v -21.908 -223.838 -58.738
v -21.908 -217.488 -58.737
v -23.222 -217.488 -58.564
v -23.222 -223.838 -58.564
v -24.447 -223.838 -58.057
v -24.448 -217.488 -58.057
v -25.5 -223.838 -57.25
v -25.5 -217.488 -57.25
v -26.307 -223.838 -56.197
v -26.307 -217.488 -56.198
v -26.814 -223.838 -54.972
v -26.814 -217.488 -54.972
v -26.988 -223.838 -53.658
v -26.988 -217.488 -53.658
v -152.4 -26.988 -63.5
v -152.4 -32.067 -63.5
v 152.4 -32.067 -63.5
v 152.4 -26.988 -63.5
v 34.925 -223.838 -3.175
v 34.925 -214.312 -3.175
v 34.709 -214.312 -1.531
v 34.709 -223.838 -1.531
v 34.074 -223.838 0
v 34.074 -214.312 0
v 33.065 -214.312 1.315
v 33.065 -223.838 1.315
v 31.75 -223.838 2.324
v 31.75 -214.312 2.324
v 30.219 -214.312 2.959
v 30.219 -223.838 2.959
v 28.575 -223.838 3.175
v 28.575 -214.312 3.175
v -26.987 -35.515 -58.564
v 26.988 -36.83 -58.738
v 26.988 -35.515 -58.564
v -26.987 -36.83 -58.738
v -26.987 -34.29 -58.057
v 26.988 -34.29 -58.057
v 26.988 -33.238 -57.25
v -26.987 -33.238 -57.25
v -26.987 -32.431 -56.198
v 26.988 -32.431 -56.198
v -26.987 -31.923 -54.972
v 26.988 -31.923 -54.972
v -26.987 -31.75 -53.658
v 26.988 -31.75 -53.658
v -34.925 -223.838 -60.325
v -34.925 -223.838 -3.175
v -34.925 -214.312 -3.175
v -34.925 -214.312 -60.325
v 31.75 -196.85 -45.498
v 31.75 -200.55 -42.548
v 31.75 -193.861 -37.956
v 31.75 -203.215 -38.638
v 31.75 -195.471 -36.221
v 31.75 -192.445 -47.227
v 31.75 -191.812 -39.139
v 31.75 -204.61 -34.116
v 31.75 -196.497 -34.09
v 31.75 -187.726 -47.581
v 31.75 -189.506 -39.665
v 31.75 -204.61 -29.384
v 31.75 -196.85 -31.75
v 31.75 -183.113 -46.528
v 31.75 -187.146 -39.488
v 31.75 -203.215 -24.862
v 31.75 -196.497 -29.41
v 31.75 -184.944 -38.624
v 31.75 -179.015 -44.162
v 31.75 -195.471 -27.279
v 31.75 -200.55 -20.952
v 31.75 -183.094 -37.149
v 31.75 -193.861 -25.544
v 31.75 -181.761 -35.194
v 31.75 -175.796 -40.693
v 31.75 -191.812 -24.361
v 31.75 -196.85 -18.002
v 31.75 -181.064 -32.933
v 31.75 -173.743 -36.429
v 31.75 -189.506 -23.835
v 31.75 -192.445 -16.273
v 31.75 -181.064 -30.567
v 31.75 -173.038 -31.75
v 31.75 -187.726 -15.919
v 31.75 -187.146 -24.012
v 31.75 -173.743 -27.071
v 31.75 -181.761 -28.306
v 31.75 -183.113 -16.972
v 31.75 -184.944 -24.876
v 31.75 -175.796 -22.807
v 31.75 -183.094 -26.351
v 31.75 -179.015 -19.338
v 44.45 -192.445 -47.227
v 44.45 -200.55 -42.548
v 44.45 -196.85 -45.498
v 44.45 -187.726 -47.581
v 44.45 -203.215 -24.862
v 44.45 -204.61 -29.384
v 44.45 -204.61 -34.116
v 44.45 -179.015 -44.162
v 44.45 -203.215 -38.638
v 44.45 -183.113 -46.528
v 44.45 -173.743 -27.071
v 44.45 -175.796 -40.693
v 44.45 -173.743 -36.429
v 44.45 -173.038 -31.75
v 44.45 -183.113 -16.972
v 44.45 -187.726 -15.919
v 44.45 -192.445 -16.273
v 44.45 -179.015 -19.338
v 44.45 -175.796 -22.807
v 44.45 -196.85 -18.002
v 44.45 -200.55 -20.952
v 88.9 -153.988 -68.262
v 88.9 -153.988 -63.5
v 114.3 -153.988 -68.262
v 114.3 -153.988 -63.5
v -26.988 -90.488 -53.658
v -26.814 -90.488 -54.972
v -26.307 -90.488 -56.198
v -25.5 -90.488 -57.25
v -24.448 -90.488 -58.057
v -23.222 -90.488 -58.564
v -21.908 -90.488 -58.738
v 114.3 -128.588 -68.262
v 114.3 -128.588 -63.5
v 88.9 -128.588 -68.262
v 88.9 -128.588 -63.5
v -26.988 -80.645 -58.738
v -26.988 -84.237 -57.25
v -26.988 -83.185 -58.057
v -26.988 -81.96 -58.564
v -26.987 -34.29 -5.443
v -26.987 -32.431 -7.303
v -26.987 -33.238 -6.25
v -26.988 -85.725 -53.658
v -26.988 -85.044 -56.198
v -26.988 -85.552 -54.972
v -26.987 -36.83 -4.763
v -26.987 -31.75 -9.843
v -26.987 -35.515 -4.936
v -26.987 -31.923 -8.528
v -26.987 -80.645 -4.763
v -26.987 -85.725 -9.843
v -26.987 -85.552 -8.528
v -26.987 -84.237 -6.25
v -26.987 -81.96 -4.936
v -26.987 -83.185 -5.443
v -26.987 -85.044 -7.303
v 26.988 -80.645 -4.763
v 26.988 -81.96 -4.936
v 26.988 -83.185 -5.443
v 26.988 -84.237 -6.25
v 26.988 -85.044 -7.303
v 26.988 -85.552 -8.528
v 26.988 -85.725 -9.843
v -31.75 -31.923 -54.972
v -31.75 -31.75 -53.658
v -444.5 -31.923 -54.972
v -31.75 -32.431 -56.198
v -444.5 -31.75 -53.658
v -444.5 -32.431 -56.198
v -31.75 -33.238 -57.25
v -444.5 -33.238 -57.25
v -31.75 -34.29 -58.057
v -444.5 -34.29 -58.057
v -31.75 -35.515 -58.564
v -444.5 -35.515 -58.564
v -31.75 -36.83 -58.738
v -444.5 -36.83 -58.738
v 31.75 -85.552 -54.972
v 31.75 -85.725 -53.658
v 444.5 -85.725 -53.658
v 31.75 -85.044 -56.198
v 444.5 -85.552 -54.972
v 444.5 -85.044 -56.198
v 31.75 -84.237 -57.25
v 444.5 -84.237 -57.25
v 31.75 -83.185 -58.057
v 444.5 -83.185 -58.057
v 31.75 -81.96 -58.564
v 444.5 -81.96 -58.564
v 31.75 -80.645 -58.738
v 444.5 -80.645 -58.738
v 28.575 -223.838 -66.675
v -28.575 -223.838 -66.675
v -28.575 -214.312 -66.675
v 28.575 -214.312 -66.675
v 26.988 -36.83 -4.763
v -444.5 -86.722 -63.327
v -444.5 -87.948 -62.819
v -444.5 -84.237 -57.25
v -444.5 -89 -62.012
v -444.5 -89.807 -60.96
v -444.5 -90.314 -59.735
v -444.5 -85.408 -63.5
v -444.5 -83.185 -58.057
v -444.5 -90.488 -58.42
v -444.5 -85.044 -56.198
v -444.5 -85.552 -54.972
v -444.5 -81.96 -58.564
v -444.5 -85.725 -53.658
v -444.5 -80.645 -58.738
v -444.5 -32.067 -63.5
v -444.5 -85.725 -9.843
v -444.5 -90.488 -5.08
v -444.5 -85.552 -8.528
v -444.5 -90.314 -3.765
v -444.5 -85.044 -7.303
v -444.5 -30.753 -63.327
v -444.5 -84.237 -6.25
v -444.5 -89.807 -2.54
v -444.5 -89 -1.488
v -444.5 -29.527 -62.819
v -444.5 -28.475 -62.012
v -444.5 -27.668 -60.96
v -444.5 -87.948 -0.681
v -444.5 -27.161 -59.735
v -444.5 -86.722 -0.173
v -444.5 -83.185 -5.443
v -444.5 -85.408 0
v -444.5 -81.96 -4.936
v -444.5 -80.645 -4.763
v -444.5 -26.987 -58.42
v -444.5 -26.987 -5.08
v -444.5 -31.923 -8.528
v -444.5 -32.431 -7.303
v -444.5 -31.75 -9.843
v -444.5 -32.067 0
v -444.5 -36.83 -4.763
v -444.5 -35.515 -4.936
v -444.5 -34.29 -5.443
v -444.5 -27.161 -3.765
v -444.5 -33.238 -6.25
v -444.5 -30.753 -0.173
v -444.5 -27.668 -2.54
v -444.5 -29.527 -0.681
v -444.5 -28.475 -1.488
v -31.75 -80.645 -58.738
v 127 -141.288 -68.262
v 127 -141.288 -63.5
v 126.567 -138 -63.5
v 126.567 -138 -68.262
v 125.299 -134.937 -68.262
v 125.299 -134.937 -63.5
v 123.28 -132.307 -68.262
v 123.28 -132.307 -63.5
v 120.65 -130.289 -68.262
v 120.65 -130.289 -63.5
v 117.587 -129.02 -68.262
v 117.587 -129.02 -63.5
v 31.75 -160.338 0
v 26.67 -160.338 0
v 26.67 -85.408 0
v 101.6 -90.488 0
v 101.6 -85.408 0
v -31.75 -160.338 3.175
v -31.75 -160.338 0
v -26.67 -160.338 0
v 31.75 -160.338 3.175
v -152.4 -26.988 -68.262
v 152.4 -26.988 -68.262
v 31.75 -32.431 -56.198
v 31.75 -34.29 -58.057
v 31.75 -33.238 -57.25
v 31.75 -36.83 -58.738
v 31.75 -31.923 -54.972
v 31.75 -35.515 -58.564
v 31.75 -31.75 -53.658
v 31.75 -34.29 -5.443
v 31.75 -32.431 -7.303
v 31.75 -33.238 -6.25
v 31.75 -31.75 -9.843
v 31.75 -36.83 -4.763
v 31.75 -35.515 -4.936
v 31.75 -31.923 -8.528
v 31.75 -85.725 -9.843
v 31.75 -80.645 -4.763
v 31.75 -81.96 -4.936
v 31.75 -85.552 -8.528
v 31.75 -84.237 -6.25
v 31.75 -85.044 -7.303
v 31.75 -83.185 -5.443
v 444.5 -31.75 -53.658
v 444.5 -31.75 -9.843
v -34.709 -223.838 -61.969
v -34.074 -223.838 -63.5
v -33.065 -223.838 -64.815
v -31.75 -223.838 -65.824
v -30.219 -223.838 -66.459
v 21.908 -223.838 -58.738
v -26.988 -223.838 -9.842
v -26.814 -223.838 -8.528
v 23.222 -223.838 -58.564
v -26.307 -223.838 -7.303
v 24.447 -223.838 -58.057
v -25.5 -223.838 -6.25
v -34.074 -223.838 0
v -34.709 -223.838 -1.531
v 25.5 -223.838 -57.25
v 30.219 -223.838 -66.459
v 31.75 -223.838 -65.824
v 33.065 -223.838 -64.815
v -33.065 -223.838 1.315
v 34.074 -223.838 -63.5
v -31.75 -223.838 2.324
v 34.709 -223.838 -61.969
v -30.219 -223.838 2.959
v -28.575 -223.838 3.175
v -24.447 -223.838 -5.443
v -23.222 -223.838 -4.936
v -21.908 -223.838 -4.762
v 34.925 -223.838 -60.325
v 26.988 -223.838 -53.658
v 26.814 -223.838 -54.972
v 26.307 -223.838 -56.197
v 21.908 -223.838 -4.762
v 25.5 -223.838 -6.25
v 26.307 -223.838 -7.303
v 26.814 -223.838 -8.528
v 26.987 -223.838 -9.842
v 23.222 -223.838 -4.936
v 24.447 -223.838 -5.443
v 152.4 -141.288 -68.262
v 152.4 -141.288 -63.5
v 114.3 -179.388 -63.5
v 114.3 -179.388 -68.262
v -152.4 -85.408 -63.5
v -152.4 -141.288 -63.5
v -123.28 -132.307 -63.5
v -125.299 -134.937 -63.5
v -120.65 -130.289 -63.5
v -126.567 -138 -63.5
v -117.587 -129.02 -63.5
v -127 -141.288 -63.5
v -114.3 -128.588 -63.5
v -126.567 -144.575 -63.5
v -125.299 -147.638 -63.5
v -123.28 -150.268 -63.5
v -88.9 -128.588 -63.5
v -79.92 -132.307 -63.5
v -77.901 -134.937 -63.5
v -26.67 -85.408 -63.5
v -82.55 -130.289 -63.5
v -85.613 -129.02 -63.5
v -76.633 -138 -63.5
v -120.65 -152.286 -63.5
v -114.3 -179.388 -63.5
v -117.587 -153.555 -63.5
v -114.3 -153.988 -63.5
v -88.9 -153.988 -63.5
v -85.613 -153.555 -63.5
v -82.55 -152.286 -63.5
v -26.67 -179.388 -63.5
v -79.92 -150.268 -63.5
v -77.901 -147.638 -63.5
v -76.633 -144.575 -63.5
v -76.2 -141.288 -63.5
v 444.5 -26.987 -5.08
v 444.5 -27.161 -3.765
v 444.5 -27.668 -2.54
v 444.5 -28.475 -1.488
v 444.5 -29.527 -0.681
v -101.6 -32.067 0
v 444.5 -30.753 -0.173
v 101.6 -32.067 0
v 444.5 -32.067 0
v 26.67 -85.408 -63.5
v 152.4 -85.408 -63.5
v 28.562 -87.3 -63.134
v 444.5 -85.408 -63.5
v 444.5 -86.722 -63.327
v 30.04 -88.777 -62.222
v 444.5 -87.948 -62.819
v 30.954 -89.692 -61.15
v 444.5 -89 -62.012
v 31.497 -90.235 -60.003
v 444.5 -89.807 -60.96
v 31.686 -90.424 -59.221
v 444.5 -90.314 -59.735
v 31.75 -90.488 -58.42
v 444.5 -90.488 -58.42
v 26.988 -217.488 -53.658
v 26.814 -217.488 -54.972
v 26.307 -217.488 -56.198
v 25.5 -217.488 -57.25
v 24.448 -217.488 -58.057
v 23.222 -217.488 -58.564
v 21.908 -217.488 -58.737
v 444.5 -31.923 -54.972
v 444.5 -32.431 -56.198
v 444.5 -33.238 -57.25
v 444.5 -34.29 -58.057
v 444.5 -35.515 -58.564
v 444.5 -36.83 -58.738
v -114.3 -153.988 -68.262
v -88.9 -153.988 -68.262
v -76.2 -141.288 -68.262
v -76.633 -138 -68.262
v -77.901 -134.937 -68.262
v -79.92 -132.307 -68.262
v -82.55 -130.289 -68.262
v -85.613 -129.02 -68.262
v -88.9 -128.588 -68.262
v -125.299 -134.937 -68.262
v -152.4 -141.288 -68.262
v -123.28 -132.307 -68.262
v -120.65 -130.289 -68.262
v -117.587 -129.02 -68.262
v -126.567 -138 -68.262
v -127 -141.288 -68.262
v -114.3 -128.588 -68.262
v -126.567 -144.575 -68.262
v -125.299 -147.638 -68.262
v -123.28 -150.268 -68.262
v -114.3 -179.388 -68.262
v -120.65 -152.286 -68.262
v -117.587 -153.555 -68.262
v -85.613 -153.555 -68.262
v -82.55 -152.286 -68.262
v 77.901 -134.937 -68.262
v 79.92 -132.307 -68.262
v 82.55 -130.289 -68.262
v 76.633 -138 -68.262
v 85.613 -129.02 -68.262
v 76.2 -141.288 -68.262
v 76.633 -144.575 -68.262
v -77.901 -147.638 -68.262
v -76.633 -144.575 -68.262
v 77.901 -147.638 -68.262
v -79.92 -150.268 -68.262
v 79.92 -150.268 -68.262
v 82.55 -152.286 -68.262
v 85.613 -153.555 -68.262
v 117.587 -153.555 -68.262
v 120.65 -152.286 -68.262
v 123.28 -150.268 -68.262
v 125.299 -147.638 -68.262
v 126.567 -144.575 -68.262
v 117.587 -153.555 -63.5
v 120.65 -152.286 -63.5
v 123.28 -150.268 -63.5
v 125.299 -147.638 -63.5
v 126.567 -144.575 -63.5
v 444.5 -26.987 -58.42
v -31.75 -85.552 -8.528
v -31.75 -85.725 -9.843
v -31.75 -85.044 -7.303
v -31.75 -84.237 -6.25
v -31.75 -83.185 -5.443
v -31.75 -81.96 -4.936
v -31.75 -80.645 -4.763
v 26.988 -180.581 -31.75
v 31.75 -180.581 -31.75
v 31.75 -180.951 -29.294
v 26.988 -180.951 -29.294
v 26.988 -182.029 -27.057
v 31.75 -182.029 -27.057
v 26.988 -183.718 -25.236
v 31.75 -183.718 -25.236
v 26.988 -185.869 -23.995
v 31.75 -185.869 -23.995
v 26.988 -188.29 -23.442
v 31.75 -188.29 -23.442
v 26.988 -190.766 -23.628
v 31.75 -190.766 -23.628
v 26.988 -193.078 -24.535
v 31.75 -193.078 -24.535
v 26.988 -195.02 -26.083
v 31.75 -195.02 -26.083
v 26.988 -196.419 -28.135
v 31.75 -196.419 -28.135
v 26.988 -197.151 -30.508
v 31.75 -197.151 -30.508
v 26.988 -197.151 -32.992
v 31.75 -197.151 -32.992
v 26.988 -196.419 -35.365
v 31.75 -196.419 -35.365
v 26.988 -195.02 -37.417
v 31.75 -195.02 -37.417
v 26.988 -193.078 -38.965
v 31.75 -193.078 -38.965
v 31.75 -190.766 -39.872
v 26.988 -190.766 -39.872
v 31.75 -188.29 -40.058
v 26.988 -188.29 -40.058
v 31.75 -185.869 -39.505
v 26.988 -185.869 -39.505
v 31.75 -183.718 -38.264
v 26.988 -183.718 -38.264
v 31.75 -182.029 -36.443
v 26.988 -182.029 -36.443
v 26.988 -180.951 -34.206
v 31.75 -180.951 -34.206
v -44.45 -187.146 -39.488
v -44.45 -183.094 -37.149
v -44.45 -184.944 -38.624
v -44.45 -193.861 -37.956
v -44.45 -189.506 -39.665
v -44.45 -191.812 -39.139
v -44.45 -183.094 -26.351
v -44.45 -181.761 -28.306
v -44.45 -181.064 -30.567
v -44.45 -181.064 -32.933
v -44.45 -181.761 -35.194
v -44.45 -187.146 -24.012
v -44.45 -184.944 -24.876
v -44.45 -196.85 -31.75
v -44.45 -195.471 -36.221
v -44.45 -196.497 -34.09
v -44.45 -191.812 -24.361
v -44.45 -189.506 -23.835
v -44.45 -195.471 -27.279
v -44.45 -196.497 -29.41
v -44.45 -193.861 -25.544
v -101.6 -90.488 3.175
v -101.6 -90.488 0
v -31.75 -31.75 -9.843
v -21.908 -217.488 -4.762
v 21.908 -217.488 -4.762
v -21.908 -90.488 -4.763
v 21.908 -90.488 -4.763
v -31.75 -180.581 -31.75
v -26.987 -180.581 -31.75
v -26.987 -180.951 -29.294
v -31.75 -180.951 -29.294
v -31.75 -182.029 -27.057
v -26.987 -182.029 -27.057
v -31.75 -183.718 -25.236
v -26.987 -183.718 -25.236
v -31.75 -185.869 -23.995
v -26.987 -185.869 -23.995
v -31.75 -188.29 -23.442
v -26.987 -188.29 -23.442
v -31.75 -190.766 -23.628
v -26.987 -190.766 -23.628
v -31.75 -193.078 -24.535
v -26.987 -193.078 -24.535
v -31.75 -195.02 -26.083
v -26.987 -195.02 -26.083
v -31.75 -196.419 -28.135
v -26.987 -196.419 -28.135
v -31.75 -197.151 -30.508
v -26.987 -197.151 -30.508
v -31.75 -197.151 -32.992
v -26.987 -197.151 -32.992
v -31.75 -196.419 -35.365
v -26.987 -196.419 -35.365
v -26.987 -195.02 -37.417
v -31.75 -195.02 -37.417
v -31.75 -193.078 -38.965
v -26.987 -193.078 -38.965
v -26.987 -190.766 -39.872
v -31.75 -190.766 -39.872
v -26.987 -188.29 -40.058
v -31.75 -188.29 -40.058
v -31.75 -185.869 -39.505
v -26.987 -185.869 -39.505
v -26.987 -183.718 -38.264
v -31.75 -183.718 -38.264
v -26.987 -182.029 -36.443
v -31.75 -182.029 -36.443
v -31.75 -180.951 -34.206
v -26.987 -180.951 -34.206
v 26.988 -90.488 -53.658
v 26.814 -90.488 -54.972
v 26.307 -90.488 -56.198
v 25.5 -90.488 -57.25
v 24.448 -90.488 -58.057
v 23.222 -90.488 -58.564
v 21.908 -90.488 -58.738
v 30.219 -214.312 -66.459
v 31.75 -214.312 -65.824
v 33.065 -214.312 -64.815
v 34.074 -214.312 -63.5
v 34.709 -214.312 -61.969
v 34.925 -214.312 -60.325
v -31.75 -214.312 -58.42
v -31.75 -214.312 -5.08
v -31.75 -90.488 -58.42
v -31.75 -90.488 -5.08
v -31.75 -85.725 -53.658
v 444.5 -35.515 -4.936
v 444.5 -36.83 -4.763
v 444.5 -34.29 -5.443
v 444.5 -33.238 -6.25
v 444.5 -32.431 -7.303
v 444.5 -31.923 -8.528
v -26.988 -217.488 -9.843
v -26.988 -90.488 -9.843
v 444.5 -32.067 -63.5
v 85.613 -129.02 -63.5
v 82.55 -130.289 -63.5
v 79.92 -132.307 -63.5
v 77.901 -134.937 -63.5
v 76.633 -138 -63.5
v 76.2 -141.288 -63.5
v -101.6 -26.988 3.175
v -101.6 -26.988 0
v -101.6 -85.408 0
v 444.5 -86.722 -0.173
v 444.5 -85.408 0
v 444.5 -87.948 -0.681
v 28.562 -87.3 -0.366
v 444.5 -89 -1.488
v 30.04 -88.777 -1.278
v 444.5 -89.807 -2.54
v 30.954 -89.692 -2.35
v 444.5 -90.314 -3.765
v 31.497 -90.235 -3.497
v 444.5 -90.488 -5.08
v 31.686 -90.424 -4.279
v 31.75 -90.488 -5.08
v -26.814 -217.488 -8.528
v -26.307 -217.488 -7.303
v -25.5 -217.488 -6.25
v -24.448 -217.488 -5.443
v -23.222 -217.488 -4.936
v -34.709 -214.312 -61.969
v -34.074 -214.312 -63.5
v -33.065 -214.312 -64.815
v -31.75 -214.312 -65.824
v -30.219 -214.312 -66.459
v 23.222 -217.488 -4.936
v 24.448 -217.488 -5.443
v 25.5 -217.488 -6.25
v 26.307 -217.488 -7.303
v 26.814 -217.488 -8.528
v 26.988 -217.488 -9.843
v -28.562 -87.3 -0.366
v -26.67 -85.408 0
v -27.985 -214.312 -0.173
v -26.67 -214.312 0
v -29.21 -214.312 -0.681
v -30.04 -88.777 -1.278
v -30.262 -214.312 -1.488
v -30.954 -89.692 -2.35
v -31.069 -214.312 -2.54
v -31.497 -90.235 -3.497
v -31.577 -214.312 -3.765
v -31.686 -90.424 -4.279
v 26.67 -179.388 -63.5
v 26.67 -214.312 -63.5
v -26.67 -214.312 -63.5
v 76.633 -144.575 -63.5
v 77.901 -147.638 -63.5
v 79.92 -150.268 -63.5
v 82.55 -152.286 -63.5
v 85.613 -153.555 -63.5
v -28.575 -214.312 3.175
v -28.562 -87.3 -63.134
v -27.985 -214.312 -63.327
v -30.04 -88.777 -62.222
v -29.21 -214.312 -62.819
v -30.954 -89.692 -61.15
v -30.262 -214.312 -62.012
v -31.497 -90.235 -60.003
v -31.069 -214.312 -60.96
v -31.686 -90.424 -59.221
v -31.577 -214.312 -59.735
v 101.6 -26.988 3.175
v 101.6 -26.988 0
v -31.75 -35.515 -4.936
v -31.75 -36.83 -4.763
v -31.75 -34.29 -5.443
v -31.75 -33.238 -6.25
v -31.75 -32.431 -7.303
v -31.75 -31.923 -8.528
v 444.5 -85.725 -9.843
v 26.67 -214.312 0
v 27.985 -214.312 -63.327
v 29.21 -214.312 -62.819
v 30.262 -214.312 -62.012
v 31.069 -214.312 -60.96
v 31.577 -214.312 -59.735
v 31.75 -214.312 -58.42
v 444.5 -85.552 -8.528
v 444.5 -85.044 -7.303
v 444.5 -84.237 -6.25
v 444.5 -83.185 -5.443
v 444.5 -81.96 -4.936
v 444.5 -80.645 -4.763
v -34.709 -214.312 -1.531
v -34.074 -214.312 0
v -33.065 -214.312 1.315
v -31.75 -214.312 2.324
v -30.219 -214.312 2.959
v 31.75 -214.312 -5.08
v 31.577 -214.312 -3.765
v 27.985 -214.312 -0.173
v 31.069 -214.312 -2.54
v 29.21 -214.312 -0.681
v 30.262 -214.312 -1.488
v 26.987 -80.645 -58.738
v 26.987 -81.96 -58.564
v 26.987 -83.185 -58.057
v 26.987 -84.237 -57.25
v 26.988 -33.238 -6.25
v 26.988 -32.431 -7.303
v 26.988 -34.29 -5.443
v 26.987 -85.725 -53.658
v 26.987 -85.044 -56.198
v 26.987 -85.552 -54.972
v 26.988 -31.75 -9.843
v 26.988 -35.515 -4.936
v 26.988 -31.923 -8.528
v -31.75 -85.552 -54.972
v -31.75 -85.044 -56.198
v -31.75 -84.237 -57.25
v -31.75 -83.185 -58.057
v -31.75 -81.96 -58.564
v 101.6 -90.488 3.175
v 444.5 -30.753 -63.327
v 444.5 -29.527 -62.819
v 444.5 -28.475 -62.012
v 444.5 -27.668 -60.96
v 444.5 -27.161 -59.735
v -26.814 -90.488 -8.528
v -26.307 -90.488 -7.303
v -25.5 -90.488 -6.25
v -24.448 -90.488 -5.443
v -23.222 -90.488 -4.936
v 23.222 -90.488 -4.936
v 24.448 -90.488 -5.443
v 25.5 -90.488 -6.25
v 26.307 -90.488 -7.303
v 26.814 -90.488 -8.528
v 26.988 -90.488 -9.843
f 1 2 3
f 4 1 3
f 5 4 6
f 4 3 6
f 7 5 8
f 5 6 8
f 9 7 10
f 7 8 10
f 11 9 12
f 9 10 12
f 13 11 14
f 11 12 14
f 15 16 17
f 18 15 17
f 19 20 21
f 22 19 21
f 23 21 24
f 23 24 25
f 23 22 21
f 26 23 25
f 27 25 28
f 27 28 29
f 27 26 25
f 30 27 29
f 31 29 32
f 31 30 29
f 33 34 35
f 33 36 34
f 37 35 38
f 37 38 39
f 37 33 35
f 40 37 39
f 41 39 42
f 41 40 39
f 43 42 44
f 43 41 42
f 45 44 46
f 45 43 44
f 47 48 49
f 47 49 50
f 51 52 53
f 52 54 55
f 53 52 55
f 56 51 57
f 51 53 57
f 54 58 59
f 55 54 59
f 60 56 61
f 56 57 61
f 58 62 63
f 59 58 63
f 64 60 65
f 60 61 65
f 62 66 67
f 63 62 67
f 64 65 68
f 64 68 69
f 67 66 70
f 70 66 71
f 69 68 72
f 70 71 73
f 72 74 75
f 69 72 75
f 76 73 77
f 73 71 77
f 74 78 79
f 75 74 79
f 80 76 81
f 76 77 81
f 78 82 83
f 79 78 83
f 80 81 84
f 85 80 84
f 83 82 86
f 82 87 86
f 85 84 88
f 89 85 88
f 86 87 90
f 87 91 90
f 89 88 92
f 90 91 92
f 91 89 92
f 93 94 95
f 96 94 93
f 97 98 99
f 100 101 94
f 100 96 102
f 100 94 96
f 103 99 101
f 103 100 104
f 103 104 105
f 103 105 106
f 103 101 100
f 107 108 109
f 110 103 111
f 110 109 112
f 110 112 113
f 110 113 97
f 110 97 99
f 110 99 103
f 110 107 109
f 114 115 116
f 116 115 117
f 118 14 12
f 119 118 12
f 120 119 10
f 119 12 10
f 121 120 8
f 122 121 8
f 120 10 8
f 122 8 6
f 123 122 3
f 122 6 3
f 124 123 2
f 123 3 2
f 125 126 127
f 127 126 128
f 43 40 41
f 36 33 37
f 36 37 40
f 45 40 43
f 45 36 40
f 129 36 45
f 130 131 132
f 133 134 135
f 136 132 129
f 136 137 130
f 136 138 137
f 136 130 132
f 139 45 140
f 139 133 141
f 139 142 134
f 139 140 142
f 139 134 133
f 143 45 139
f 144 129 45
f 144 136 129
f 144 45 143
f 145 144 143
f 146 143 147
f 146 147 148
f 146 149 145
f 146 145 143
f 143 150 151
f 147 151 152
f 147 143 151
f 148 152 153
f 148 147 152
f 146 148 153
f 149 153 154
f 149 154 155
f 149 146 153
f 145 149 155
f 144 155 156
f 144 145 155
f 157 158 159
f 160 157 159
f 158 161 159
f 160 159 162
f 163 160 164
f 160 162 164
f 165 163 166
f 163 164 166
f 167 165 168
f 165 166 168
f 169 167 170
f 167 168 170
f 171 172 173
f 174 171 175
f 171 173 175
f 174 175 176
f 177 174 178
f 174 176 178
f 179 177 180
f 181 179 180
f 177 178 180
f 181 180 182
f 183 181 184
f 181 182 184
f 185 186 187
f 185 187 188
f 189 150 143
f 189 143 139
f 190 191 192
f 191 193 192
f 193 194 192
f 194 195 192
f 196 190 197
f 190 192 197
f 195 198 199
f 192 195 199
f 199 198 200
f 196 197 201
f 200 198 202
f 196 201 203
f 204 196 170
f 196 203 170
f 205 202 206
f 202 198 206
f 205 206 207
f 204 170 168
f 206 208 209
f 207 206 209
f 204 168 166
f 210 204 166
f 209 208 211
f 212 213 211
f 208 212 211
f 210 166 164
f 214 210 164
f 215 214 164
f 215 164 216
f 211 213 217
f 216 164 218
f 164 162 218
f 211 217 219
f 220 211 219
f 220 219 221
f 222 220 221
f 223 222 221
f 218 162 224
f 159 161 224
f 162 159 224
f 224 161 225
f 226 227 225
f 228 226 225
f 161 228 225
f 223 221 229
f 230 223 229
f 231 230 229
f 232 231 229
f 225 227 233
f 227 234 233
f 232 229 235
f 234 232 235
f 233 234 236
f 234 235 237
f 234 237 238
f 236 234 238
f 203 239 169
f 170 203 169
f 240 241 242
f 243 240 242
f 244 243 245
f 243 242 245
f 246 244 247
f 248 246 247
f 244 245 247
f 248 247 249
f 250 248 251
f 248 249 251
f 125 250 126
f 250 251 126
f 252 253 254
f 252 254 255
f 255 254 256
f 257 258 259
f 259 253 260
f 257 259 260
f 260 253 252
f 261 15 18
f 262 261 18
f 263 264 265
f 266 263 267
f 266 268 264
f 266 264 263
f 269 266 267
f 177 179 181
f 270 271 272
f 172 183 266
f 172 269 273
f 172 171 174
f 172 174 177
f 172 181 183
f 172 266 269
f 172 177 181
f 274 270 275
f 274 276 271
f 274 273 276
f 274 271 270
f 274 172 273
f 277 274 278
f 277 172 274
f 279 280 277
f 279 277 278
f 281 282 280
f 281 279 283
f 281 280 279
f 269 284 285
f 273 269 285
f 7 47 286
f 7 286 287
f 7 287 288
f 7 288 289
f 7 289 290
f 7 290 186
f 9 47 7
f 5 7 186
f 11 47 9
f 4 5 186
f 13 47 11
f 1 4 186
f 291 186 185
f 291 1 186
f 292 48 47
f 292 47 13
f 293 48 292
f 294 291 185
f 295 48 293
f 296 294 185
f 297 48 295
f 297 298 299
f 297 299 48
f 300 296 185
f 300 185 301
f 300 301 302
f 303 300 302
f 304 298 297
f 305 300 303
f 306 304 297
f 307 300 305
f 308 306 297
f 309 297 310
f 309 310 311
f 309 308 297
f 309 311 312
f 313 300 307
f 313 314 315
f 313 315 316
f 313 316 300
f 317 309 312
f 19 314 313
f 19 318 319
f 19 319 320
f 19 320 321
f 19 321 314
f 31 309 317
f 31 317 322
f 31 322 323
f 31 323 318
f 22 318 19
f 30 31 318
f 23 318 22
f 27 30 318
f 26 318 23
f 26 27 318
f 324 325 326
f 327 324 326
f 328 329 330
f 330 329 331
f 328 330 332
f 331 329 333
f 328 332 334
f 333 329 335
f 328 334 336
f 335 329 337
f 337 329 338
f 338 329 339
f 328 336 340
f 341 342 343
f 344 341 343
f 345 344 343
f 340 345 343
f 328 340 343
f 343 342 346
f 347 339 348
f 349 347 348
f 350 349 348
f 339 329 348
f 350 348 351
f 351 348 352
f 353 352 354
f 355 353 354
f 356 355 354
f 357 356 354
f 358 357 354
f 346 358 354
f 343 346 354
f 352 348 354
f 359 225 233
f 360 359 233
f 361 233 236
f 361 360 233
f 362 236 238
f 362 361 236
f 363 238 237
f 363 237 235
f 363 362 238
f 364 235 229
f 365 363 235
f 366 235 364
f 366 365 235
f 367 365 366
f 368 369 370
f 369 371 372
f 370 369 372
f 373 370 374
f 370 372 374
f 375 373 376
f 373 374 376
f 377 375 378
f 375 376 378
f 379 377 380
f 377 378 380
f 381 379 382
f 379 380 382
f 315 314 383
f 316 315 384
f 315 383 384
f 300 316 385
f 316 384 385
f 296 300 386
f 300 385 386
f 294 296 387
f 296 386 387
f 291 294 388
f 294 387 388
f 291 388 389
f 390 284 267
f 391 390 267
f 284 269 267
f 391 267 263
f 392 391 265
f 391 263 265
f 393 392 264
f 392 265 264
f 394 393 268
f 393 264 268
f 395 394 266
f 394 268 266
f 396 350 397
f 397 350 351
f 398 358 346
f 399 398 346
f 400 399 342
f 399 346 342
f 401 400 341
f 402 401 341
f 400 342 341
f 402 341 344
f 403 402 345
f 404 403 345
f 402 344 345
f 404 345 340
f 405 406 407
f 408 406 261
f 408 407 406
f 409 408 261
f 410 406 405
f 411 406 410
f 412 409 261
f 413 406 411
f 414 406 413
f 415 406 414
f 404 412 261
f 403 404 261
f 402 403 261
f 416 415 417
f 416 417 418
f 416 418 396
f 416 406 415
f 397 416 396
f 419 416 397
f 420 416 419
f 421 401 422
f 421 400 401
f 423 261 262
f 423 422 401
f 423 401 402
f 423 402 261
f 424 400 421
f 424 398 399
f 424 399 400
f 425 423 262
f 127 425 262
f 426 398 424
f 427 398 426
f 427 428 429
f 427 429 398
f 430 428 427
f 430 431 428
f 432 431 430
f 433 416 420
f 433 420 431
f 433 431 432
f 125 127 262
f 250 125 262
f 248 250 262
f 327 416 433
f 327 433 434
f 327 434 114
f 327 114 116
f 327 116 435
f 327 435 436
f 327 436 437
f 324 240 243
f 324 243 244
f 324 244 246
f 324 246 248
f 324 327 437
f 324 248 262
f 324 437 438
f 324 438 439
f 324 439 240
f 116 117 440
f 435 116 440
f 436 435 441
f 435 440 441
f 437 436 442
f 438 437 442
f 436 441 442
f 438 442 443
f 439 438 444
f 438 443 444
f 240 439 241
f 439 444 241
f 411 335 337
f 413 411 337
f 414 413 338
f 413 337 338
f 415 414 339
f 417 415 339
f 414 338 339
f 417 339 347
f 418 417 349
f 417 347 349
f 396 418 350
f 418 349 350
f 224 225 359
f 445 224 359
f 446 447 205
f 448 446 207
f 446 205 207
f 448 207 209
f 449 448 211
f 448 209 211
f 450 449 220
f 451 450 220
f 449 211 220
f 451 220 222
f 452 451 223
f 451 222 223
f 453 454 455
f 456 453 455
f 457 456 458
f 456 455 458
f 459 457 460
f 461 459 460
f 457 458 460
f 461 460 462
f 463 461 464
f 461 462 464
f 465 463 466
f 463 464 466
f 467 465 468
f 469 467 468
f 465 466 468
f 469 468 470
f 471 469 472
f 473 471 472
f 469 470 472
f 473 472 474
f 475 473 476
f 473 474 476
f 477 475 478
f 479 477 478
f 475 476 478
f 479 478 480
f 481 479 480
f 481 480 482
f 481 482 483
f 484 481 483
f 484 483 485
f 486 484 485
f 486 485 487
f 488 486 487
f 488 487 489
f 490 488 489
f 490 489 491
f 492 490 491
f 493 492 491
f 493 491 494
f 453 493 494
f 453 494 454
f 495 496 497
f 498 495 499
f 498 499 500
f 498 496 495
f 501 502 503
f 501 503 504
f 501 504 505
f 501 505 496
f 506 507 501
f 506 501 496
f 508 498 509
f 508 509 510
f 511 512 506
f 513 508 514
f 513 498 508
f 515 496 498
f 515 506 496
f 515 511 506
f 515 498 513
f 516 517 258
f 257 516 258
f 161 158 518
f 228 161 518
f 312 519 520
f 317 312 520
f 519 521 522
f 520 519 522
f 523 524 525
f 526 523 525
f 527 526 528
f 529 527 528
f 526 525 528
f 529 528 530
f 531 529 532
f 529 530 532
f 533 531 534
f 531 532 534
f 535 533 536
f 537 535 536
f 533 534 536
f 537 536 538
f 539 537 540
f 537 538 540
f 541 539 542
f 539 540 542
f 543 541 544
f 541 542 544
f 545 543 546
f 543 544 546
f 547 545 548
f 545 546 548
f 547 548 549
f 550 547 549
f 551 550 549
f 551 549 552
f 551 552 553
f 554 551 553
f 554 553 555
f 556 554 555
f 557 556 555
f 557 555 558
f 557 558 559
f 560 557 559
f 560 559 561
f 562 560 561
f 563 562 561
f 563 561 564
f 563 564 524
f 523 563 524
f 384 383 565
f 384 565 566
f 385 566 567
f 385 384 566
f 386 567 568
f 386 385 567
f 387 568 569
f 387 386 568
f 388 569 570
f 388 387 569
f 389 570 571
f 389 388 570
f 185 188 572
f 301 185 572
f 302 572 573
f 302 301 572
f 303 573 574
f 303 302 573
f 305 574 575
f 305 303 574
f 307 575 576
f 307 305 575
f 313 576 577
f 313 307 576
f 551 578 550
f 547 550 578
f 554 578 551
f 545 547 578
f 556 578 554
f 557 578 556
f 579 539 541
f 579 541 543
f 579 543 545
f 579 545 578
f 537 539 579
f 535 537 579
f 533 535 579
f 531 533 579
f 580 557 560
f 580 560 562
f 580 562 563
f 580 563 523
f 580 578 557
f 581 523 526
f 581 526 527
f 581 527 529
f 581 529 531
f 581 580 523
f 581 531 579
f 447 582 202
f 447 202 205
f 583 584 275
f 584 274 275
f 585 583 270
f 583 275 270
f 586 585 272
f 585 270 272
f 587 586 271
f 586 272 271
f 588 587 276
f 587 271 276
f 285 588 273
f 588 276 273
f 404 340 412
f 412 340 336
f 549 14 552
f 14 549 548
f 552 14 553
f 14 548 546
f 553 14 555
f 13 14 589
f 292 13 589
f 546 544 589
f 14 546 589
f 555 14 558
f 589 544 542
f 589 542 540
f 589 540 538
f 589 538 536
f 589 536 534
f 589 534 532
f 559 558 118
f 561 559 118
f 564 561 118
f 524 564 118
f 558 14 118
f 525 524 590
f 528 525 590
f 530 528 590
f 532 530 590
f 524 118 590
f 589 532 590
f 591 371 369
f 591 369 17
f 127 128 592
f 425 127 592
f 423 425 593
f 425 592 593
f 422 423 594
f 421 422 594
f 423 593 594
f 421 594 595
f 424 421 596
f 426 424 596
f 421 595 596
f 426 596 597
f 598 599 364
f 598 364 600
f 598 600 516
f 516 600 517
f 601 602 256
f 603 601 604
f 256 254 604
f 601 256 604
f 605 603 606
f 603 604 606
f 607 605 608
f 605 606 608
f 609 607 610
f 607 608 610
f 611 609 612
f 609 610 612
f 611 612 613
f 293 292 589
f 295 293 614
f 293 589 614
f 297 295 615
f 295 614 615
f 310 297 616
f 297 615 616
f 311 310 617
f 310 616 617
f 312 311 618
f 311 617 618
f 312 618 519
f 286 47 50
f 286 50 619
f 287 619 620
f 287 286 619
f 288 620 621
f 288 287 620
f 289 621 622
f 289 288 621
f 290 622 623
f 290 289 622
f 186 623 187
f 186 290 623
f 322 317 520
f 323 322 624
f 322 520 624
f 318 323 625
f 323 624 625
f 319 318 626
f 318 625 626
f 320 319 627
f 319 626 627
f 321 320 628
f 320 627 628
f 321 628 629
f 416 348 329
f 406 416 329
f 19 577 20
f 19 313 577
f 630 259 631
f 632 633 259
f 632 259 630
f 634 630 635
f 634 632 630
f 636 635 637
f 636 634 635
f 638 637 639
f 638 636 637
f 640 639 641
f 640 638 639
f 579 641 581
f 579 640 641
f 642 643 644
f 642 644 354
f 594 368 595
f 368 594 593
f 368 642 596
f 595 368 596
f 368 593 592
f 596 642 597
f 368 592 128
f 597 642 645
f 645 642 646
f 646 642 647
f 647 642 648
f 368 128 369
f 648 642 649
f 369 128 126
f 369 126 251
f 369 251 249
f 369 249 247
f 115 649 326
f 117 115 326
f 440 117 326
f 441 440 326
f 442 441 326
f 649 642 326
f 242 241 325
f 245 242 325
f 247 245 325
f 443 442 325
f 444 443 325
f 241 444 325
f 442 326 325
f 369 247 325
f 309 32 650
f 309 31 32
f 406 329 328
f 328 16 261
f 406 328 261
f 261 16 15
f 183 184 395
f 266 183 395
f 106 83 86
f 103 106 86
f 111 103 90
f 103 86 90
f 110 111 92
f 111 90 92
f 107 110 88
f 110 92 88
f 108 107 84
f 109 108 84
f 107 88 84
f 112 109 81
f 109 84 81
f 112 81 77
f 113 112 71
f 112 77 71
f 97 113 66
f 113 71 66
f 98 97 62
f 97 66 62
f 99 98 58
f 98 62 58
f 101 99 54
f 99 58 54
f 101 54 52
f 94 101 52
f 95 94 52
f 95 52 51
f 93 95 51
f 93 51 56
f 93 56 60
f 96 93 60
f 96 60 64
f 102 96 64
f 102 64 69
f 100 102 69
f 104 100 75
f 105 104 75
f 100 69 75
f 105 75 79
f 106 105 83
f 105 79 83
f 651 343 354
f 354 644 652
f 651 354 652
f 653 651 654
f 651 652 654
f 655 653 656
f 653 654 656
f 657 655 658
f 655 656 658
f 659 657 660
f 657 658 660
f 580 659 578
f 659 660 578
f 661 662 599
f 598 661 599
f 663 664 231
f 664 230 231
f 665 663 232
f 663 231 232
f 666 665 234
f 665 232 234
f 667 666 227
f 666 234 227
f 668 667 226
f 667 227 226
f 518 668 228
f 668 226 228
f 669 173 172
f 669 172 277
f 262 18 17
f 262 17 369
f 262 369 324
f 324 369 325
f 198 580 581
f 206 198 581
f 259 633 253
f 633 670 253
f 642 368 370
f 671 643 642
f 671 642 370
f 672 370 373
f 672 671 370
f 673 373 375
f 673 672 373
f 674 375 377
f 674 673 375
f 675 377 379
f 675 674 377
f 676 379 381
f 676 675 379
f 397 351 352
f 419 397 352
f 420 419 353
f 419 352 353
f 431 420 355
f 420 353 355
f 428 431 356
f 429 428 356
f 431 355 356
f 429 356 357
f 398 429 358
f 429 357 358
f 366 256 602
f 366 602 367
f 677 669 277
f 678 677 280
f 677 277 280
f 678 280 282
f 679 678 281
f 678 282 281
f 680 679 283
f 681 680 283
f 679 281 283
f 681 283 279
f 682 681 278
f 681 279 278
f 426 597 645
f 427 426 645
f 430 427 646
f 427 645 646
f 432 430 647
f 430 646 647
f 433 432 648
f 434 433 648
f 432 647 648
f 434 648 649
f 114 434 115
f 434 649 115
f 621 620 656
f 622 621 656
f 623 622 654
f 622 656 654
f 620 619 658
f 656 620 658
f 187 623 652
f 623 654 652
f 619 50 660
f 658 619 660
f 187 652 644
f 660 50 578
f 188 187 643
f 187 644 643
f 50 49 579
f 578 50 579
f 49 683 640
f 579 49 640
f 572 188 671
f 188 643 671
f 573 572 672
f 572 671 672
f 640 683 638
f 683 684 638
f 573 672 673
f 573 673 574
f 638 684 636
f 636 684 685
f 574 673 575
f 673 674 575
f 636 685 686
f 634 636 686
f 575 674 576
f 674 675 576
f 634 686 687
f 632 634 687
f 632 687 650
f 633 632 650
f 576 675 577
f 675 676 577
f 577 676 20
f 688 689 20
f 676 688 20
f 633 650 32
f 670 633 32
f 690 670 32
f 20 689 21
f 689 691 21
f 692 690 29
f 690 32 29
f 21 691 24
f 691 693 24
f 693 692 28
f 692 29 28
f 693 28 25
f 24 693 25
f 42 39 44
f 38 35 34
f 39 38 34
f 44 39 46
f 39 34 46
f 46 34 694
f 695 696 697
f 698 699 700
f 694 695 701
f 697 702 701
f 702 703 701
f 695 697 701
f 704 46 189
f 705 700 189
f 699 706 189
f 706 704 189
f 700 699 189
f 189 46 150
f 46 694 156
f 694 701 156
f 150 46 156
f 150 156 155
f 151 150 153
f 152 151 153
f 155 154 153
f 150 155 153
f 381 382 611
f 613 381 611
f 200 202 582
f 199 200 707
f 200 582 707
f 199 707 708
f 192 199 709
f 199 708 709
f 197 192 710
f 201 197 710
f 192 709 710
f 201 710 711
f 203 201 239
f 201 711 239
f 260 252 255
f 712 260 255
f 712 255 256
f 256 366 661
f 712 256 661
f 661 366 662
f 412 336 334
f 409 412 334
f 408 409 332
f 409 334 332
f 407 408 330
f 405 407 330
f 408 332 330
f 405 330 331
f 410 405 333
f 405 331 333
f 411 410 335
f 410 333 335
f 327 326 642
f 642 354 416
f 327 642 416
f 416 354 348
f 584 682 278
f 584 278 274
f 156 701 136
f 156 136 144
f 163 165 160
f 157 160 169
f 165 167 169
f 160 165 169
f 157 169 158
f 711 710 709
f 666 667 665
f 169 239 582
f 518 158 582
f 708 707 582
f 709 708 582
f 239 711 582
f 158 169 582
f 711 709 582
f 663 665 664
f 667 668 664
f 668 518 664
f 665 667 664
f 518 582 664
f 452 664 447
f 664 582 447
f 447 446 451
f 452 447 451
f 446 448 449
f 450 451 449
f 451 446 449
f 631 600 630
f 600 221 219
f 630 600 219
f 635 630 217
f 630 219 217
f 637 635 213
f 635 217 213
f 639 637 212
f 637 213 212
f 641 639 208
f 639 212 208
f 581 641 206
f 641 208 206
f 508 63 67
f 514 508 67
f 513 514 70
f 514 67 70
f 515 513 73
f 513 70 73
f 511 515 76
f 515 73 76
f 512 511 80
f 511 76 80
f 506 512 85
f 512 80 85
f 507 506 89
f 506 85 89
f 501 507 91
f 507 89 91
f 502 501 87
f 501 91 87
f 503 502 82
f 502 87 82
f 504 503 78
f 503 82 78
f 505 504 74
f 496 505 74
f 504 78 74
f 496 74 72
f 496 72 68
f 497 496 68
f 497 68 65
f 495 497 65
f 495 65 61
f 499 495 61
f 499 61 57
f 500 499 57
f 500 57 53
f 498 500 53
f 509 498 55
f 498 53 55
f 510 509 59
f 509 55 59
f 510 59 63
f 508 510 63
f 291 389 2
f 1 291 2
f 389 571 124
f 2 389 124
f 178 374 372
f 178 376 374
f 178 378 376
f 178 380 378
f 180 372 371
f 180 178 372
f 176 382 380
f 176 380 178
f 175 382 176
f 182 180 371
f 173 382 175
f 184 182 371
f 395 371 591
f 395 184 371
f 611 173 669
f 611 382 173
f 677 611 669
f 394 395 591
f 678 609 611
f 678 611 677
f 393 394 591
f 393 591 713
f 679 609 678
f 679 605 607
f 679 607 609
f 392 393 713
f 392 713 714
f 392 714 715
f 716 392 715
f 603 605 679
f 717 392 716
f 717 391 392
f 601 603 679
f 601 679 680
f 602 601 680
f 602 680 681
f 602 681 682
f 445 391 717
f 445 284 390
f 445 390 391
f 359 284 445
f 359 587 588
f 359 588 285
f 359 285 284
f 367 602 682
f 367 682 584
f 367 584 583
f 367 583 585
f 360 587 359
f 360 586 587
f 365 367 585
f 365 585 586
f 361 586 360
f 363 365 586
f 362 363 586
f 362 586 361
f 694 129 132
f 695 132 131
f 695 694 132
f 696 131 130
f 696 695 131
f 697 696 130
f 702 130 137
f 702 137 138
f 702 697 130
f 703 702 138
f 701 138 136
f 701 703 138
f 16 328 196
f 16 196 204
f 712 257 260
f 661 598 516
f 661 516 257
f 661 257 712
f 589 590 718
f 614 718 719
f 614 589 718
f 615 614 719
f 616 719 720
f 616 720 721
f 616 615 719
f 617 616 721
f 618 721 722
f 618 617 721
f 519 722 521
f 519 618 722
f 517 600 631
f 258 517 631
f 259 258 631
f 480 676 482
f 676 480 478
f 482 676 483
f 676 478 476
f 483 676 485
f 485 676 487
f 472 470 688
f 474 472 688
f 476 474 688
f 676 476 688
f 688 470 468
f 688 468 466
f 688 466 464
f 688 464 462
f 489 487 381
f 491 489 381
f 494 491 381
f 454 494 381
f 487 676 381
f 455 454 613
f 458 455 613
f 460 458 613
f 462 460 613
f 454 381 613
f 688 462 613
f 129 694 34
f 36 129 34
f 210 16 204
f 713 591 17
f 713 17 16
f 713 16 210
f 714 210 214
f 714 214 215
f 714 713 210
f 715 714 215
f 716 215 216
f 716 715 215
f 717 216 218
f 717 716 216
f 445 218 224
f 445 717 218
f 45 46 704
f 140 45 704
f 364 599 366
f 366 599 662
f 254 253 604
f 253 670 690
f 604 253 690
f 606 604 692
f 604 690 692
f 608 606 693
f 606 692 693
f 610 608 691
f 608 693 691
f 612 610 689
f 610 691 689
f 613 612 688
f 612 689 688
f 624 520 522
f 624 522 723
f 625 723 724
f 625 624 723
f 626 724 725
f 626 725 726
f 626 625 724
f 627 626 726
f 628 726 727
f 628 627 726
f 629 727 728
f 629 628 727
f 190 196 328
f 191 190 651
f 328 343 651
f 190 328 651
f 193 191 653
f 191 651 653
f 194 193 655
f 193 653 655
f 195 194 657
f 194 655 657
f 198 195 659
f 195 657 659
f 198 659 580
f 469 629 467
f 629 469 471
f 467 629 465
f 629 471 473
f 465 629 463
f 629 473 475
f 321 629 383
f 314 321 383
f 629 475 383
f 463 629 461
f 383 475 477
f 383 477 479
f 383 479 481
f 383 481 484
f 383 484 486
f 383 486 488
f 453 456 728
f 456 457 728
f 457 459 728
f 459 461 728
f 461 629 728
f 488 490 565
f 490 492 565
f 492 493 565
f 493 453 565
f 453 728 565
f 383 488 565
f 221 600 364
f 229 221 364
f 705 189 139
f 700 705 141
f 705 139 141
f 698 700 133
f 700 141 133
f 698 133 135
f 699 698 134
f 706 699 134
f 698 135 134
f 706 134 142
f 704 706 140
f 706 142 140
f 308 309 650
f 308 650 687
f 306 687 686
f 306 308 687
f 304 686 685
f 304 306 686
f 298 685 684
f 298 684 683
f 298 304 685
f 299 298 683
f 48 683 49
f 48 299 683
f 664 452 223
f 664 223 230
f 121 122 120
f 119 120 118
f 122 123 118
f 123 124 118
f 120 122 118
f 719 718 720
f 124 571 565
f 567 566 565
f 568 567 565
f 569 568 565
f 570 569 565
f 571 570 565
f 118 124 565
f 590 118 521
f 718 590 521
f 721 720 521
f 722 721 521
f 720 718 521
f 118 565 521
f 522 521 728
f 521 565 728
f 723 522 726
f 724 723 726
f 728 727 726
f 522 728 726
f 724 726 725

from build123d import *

# Parameters (mm, degrees)
F0_W           = 63.5
F0_H           = 63.5
F0_W_2         = 53.975
F0_H_2         = 53.975
F1_DEPTH       = 444.5
F2_W           = 63.5
F2_H           = 63.5
F2_W_2         = 53.975
F2_H_2         = 53.975
F3_DEPTH       = 127
F3_DEPTH_BACK  = 63.5
F4_R           = 5.08
F6_DEPTH       = 3.175
F8_DEPTH       = 4.7625
F10_DEPTH      = 6.35
F10_DEPTH_BACK = 3.175
F12_R          = 8.3312
F13_DEPTH      = 476.251
F14_R          = 15.875
F15_DEPTH      = 12.7
F16_R          = 7.9375
F17_DEPTH      = 76.2


with BuildPart() as f1:
    # F0 (on Right) → F1 (new body, symmetric)
    with BuildSketch(Plane.YZ):
        with Locations((-58.7375, -31.75)):
            Rectangle(F0_W, F0_H)
        with Locations((-58.7375, -31.75)):
            Rectangle(F0_W_2, F0_H_2, mode=Mode.SUBTRACT)
    extrude(amount=F1_DEPTH, both=True)

    # F2 (on face) → F3 (join, two sides)
    with BuildSketch(Plane.XZ.offset(90.4875)) as f3_sk:
        with Locations((0, -31.75)):
            Rectangle(F2_W, F2_H)
        with Locations((0, -31.75)):
            Rectangle(F2_W_2, F2_H_2, mode=Mode.SUBTRACT)
    extrude(amount=F3_DEPTH)
    extrude(f3_sk.sketch, amount=-F3_DEPTH_BACK)

    # F4
    f4_edges = [f1.edges().sort_by_distance(p)[0] for p in [
        (-238.125, -90.4875, 0),
        (238.125, -90.4875, 0),
        (0, -26.9875, 0),
        (0, -26.9875, -63.5),
        (-238.125, -90.4875, -63.5),
        (238.125, -90.4875, -63.5),
        (0, -31.75, -4.7625),
        (0, -85.725, -4.7625),
        (0, -31.75, -58.7375),
        (0, -85.725, -58.7375),
        (-31.75, -153.9875, 0),
        (31.75, -153.9875, 0),
        (31.75, -153.9875, -63.5),
        (-31.75, -153.9875, -63.5),
        (-26.9875, -153.9875, -4.7625),
        (26.9875, -153.9875, -4.7625),
        (-26.9875, -153.9875, -58.7375),
        (26.9875, -153.9875, -58.7375),
        (238.125, -85.725, -58.7375),
        (238.125, -85.725, -4.7625),
        (238.125, -31.75, -58.7375),
        (238.125, -31.75, -4.7625),
        (-238.125, -85.725, -4.7625),
        (-238.125, -85.725, -58.7375),
        (-238.125, -31.75, -58.7375),
        (-238.125, -31.75, -4.7625),
    ]]
    fillet(f4_edges, radius=F4_R)

    # F5 (on face) → F6 (join)
    with BuildSketch(Plane.XY):
        Polygon((101.6, -26.9875), (-101.6, -26.9875), (-101.6, -90.4875), (-31.75, -90.4875), (-31.75, -160.3375), (31.75, -160.3375), (31.75, -90.4875), (101.6, -90.4875), align=None)
        Polygon((-31.75, -90.4875), (-101.6, -90.4875), (-31.75, -160.3375), align=None)
        Polygon((31.75, -160.3375), (101.6, -90.4875), (31.75, -90.4875), align=None)
    extrude(amount=F6_DEPTH)

    # F7 (on face) → F8 (join)
    with BuildSketch(Plane(origin=(0, 0, -63.5), x_dir=(1, 0, 0), z_dir=(0, 0, -1))):
        Polygon((-152.4, 26.9875), (152.4, 26.9875), (152.4, 141.2875), (114.3, 179.3875), (-114.3, 179.3875), (-152.4, 141.2875), align=None)
        with BuildLine():
            ThreePointArc((-127, 141.2875), (-123.2802561211, 150.2677561211), (-114.3, 153.9875))
            Line((-114.3, 153.9875), (-88.9, 153.9875))
            ThreePointArc((-88.9, 153.9875), (-79.9197438789, 150.2677561211), (-76.2, 141.2875))
            ThreePointArc((-76.2, 141.2875), (-79.9197438789, 132.3072438789), (-88.9, 128.5875))
            Line((-88.9, 128.5875), (-114.3, 128.5875))
            ThreePointArc((-114.3, 128.5875), (-123.2802561211, 132.3072438789), (-127, 141.2875))
        make_face(mode=Mode.SUBTRACT)
        with BuildLine():
            Line((114.3, 128.5875), (88.9, 128.5875))
            ThreePointArc((88.9, 128.5875), (79.9197438789, 132.3072438789), (76.2, 141.2875))
            ThreePointArc((76.2, 141.2875), (79.9197438789, 150.2677561211), (88.9, 153.9875))
            Line((88.9, 153.9875), (114.3, 153.9875))
            ThreePointArc((114.3, 153.9875), (123.2802561211, 150.2677561211), (127, 141.2875))
            ThreePointArc((127, 141.2875), (123.2802561211, 132.3072438789), (114.3, 128.5875))
        make_face(mode=Mode.SUBTRACT)
    extrude(amount=F8_DEPTH)

    # F9 (on face) → F10 (join, two sides)
    with BuildSketch(Plane.XZ.offset(217.4875)) as f10_sk:
        with BuildLine():
            Line((28.575, 3.175), (-28.575, 3.175))
            ThreePointArc((-28.575, 3.175), (-33.0651280605, 1.3151280605), (-34.925, -3.175))
            Line((-34.925, -3.175), (-34.925, -60.325))
            ThreePointArc((-34.925, -60.325), (-33.0651280605, -64.8151280605), (-28.575, -66.675))
            Line((-28.575, -66.675), (28.575, -66.675))
            ThreePointArc((28.575, -66.675), (33.0651280605, -64.8151280605), (34.925, -60.325))
            Line((34.925, -60.325), (34.925, -3.175))
            ThreePointArc((34.925, -3.175), (33.0651280605, 1.3151280605), (28.575, 3.175))
        make_face()
        with BuildLine():
            ThreePointArc((-26.9875, -9.8425), (-25.4996024484, -6.2503975516), (-21.9075, -4.7625))
            Line((-21.9075, -4.7625), (21.9075, -4.7625))
            ThreePointArc((21.9075, -4.7625), (25.4996024484, -6.2503975516), (26.9875, -9.8425))
            Line((26.9875, -9.8425), (26.9875, -53.6575))
            ThreePointArc((26.9875, -53.6575), (25.4996024484, -57.2496024484), (21.9075, -58.7375))
            Line((21.9075, -58.7375), (-21.9075, -58.7375))
            ThreePointArc((-21.9075, -58.7375), (-25.4996024484, -57.2496024484), (-26.9875, -53.6575))
            Line((-26.9875, -53.6575), (-26.9875, -9.8425))
        make_face(mode=Mode.SUBTRACT)
    extrude(amount=F10_DEPTH)
    extrude(f10_sk.sketch, amount=-F10_DEPTH_BACK)

    # F12 (on face) → F13 (cut, through all)
    with BuildSketch(Plane.YZ.offset(31.75)):
        with Locations((-188.9125, -31.75)):
            Circle(F12_R)
    extrude(amount=-F13_DEPTH, mode=Mode.SUBTRACT)


with BuildPart() as f15:
    # F14 (on face) → F15 (new body)
    with BuildSketch(Plane.YZ.offset(31.75)):
        with Locations((-188.9125, -31.75)):
            Circle(F14_R)
    extrude(amount=F15_DEPTH)

    # F16 (on face) → F17 (join)
    with BuildSketch(Plane(origin=(31.75, 0, 0), x_dir=(0, -1, 0), z_dir=(-1, 0, 0))):
        with Locations((188.9125, -31.75)):
            Circle(F16_R)
    extrude(amount=F17_DEPTH)


solid = Compound([f1.part, f15.part])
